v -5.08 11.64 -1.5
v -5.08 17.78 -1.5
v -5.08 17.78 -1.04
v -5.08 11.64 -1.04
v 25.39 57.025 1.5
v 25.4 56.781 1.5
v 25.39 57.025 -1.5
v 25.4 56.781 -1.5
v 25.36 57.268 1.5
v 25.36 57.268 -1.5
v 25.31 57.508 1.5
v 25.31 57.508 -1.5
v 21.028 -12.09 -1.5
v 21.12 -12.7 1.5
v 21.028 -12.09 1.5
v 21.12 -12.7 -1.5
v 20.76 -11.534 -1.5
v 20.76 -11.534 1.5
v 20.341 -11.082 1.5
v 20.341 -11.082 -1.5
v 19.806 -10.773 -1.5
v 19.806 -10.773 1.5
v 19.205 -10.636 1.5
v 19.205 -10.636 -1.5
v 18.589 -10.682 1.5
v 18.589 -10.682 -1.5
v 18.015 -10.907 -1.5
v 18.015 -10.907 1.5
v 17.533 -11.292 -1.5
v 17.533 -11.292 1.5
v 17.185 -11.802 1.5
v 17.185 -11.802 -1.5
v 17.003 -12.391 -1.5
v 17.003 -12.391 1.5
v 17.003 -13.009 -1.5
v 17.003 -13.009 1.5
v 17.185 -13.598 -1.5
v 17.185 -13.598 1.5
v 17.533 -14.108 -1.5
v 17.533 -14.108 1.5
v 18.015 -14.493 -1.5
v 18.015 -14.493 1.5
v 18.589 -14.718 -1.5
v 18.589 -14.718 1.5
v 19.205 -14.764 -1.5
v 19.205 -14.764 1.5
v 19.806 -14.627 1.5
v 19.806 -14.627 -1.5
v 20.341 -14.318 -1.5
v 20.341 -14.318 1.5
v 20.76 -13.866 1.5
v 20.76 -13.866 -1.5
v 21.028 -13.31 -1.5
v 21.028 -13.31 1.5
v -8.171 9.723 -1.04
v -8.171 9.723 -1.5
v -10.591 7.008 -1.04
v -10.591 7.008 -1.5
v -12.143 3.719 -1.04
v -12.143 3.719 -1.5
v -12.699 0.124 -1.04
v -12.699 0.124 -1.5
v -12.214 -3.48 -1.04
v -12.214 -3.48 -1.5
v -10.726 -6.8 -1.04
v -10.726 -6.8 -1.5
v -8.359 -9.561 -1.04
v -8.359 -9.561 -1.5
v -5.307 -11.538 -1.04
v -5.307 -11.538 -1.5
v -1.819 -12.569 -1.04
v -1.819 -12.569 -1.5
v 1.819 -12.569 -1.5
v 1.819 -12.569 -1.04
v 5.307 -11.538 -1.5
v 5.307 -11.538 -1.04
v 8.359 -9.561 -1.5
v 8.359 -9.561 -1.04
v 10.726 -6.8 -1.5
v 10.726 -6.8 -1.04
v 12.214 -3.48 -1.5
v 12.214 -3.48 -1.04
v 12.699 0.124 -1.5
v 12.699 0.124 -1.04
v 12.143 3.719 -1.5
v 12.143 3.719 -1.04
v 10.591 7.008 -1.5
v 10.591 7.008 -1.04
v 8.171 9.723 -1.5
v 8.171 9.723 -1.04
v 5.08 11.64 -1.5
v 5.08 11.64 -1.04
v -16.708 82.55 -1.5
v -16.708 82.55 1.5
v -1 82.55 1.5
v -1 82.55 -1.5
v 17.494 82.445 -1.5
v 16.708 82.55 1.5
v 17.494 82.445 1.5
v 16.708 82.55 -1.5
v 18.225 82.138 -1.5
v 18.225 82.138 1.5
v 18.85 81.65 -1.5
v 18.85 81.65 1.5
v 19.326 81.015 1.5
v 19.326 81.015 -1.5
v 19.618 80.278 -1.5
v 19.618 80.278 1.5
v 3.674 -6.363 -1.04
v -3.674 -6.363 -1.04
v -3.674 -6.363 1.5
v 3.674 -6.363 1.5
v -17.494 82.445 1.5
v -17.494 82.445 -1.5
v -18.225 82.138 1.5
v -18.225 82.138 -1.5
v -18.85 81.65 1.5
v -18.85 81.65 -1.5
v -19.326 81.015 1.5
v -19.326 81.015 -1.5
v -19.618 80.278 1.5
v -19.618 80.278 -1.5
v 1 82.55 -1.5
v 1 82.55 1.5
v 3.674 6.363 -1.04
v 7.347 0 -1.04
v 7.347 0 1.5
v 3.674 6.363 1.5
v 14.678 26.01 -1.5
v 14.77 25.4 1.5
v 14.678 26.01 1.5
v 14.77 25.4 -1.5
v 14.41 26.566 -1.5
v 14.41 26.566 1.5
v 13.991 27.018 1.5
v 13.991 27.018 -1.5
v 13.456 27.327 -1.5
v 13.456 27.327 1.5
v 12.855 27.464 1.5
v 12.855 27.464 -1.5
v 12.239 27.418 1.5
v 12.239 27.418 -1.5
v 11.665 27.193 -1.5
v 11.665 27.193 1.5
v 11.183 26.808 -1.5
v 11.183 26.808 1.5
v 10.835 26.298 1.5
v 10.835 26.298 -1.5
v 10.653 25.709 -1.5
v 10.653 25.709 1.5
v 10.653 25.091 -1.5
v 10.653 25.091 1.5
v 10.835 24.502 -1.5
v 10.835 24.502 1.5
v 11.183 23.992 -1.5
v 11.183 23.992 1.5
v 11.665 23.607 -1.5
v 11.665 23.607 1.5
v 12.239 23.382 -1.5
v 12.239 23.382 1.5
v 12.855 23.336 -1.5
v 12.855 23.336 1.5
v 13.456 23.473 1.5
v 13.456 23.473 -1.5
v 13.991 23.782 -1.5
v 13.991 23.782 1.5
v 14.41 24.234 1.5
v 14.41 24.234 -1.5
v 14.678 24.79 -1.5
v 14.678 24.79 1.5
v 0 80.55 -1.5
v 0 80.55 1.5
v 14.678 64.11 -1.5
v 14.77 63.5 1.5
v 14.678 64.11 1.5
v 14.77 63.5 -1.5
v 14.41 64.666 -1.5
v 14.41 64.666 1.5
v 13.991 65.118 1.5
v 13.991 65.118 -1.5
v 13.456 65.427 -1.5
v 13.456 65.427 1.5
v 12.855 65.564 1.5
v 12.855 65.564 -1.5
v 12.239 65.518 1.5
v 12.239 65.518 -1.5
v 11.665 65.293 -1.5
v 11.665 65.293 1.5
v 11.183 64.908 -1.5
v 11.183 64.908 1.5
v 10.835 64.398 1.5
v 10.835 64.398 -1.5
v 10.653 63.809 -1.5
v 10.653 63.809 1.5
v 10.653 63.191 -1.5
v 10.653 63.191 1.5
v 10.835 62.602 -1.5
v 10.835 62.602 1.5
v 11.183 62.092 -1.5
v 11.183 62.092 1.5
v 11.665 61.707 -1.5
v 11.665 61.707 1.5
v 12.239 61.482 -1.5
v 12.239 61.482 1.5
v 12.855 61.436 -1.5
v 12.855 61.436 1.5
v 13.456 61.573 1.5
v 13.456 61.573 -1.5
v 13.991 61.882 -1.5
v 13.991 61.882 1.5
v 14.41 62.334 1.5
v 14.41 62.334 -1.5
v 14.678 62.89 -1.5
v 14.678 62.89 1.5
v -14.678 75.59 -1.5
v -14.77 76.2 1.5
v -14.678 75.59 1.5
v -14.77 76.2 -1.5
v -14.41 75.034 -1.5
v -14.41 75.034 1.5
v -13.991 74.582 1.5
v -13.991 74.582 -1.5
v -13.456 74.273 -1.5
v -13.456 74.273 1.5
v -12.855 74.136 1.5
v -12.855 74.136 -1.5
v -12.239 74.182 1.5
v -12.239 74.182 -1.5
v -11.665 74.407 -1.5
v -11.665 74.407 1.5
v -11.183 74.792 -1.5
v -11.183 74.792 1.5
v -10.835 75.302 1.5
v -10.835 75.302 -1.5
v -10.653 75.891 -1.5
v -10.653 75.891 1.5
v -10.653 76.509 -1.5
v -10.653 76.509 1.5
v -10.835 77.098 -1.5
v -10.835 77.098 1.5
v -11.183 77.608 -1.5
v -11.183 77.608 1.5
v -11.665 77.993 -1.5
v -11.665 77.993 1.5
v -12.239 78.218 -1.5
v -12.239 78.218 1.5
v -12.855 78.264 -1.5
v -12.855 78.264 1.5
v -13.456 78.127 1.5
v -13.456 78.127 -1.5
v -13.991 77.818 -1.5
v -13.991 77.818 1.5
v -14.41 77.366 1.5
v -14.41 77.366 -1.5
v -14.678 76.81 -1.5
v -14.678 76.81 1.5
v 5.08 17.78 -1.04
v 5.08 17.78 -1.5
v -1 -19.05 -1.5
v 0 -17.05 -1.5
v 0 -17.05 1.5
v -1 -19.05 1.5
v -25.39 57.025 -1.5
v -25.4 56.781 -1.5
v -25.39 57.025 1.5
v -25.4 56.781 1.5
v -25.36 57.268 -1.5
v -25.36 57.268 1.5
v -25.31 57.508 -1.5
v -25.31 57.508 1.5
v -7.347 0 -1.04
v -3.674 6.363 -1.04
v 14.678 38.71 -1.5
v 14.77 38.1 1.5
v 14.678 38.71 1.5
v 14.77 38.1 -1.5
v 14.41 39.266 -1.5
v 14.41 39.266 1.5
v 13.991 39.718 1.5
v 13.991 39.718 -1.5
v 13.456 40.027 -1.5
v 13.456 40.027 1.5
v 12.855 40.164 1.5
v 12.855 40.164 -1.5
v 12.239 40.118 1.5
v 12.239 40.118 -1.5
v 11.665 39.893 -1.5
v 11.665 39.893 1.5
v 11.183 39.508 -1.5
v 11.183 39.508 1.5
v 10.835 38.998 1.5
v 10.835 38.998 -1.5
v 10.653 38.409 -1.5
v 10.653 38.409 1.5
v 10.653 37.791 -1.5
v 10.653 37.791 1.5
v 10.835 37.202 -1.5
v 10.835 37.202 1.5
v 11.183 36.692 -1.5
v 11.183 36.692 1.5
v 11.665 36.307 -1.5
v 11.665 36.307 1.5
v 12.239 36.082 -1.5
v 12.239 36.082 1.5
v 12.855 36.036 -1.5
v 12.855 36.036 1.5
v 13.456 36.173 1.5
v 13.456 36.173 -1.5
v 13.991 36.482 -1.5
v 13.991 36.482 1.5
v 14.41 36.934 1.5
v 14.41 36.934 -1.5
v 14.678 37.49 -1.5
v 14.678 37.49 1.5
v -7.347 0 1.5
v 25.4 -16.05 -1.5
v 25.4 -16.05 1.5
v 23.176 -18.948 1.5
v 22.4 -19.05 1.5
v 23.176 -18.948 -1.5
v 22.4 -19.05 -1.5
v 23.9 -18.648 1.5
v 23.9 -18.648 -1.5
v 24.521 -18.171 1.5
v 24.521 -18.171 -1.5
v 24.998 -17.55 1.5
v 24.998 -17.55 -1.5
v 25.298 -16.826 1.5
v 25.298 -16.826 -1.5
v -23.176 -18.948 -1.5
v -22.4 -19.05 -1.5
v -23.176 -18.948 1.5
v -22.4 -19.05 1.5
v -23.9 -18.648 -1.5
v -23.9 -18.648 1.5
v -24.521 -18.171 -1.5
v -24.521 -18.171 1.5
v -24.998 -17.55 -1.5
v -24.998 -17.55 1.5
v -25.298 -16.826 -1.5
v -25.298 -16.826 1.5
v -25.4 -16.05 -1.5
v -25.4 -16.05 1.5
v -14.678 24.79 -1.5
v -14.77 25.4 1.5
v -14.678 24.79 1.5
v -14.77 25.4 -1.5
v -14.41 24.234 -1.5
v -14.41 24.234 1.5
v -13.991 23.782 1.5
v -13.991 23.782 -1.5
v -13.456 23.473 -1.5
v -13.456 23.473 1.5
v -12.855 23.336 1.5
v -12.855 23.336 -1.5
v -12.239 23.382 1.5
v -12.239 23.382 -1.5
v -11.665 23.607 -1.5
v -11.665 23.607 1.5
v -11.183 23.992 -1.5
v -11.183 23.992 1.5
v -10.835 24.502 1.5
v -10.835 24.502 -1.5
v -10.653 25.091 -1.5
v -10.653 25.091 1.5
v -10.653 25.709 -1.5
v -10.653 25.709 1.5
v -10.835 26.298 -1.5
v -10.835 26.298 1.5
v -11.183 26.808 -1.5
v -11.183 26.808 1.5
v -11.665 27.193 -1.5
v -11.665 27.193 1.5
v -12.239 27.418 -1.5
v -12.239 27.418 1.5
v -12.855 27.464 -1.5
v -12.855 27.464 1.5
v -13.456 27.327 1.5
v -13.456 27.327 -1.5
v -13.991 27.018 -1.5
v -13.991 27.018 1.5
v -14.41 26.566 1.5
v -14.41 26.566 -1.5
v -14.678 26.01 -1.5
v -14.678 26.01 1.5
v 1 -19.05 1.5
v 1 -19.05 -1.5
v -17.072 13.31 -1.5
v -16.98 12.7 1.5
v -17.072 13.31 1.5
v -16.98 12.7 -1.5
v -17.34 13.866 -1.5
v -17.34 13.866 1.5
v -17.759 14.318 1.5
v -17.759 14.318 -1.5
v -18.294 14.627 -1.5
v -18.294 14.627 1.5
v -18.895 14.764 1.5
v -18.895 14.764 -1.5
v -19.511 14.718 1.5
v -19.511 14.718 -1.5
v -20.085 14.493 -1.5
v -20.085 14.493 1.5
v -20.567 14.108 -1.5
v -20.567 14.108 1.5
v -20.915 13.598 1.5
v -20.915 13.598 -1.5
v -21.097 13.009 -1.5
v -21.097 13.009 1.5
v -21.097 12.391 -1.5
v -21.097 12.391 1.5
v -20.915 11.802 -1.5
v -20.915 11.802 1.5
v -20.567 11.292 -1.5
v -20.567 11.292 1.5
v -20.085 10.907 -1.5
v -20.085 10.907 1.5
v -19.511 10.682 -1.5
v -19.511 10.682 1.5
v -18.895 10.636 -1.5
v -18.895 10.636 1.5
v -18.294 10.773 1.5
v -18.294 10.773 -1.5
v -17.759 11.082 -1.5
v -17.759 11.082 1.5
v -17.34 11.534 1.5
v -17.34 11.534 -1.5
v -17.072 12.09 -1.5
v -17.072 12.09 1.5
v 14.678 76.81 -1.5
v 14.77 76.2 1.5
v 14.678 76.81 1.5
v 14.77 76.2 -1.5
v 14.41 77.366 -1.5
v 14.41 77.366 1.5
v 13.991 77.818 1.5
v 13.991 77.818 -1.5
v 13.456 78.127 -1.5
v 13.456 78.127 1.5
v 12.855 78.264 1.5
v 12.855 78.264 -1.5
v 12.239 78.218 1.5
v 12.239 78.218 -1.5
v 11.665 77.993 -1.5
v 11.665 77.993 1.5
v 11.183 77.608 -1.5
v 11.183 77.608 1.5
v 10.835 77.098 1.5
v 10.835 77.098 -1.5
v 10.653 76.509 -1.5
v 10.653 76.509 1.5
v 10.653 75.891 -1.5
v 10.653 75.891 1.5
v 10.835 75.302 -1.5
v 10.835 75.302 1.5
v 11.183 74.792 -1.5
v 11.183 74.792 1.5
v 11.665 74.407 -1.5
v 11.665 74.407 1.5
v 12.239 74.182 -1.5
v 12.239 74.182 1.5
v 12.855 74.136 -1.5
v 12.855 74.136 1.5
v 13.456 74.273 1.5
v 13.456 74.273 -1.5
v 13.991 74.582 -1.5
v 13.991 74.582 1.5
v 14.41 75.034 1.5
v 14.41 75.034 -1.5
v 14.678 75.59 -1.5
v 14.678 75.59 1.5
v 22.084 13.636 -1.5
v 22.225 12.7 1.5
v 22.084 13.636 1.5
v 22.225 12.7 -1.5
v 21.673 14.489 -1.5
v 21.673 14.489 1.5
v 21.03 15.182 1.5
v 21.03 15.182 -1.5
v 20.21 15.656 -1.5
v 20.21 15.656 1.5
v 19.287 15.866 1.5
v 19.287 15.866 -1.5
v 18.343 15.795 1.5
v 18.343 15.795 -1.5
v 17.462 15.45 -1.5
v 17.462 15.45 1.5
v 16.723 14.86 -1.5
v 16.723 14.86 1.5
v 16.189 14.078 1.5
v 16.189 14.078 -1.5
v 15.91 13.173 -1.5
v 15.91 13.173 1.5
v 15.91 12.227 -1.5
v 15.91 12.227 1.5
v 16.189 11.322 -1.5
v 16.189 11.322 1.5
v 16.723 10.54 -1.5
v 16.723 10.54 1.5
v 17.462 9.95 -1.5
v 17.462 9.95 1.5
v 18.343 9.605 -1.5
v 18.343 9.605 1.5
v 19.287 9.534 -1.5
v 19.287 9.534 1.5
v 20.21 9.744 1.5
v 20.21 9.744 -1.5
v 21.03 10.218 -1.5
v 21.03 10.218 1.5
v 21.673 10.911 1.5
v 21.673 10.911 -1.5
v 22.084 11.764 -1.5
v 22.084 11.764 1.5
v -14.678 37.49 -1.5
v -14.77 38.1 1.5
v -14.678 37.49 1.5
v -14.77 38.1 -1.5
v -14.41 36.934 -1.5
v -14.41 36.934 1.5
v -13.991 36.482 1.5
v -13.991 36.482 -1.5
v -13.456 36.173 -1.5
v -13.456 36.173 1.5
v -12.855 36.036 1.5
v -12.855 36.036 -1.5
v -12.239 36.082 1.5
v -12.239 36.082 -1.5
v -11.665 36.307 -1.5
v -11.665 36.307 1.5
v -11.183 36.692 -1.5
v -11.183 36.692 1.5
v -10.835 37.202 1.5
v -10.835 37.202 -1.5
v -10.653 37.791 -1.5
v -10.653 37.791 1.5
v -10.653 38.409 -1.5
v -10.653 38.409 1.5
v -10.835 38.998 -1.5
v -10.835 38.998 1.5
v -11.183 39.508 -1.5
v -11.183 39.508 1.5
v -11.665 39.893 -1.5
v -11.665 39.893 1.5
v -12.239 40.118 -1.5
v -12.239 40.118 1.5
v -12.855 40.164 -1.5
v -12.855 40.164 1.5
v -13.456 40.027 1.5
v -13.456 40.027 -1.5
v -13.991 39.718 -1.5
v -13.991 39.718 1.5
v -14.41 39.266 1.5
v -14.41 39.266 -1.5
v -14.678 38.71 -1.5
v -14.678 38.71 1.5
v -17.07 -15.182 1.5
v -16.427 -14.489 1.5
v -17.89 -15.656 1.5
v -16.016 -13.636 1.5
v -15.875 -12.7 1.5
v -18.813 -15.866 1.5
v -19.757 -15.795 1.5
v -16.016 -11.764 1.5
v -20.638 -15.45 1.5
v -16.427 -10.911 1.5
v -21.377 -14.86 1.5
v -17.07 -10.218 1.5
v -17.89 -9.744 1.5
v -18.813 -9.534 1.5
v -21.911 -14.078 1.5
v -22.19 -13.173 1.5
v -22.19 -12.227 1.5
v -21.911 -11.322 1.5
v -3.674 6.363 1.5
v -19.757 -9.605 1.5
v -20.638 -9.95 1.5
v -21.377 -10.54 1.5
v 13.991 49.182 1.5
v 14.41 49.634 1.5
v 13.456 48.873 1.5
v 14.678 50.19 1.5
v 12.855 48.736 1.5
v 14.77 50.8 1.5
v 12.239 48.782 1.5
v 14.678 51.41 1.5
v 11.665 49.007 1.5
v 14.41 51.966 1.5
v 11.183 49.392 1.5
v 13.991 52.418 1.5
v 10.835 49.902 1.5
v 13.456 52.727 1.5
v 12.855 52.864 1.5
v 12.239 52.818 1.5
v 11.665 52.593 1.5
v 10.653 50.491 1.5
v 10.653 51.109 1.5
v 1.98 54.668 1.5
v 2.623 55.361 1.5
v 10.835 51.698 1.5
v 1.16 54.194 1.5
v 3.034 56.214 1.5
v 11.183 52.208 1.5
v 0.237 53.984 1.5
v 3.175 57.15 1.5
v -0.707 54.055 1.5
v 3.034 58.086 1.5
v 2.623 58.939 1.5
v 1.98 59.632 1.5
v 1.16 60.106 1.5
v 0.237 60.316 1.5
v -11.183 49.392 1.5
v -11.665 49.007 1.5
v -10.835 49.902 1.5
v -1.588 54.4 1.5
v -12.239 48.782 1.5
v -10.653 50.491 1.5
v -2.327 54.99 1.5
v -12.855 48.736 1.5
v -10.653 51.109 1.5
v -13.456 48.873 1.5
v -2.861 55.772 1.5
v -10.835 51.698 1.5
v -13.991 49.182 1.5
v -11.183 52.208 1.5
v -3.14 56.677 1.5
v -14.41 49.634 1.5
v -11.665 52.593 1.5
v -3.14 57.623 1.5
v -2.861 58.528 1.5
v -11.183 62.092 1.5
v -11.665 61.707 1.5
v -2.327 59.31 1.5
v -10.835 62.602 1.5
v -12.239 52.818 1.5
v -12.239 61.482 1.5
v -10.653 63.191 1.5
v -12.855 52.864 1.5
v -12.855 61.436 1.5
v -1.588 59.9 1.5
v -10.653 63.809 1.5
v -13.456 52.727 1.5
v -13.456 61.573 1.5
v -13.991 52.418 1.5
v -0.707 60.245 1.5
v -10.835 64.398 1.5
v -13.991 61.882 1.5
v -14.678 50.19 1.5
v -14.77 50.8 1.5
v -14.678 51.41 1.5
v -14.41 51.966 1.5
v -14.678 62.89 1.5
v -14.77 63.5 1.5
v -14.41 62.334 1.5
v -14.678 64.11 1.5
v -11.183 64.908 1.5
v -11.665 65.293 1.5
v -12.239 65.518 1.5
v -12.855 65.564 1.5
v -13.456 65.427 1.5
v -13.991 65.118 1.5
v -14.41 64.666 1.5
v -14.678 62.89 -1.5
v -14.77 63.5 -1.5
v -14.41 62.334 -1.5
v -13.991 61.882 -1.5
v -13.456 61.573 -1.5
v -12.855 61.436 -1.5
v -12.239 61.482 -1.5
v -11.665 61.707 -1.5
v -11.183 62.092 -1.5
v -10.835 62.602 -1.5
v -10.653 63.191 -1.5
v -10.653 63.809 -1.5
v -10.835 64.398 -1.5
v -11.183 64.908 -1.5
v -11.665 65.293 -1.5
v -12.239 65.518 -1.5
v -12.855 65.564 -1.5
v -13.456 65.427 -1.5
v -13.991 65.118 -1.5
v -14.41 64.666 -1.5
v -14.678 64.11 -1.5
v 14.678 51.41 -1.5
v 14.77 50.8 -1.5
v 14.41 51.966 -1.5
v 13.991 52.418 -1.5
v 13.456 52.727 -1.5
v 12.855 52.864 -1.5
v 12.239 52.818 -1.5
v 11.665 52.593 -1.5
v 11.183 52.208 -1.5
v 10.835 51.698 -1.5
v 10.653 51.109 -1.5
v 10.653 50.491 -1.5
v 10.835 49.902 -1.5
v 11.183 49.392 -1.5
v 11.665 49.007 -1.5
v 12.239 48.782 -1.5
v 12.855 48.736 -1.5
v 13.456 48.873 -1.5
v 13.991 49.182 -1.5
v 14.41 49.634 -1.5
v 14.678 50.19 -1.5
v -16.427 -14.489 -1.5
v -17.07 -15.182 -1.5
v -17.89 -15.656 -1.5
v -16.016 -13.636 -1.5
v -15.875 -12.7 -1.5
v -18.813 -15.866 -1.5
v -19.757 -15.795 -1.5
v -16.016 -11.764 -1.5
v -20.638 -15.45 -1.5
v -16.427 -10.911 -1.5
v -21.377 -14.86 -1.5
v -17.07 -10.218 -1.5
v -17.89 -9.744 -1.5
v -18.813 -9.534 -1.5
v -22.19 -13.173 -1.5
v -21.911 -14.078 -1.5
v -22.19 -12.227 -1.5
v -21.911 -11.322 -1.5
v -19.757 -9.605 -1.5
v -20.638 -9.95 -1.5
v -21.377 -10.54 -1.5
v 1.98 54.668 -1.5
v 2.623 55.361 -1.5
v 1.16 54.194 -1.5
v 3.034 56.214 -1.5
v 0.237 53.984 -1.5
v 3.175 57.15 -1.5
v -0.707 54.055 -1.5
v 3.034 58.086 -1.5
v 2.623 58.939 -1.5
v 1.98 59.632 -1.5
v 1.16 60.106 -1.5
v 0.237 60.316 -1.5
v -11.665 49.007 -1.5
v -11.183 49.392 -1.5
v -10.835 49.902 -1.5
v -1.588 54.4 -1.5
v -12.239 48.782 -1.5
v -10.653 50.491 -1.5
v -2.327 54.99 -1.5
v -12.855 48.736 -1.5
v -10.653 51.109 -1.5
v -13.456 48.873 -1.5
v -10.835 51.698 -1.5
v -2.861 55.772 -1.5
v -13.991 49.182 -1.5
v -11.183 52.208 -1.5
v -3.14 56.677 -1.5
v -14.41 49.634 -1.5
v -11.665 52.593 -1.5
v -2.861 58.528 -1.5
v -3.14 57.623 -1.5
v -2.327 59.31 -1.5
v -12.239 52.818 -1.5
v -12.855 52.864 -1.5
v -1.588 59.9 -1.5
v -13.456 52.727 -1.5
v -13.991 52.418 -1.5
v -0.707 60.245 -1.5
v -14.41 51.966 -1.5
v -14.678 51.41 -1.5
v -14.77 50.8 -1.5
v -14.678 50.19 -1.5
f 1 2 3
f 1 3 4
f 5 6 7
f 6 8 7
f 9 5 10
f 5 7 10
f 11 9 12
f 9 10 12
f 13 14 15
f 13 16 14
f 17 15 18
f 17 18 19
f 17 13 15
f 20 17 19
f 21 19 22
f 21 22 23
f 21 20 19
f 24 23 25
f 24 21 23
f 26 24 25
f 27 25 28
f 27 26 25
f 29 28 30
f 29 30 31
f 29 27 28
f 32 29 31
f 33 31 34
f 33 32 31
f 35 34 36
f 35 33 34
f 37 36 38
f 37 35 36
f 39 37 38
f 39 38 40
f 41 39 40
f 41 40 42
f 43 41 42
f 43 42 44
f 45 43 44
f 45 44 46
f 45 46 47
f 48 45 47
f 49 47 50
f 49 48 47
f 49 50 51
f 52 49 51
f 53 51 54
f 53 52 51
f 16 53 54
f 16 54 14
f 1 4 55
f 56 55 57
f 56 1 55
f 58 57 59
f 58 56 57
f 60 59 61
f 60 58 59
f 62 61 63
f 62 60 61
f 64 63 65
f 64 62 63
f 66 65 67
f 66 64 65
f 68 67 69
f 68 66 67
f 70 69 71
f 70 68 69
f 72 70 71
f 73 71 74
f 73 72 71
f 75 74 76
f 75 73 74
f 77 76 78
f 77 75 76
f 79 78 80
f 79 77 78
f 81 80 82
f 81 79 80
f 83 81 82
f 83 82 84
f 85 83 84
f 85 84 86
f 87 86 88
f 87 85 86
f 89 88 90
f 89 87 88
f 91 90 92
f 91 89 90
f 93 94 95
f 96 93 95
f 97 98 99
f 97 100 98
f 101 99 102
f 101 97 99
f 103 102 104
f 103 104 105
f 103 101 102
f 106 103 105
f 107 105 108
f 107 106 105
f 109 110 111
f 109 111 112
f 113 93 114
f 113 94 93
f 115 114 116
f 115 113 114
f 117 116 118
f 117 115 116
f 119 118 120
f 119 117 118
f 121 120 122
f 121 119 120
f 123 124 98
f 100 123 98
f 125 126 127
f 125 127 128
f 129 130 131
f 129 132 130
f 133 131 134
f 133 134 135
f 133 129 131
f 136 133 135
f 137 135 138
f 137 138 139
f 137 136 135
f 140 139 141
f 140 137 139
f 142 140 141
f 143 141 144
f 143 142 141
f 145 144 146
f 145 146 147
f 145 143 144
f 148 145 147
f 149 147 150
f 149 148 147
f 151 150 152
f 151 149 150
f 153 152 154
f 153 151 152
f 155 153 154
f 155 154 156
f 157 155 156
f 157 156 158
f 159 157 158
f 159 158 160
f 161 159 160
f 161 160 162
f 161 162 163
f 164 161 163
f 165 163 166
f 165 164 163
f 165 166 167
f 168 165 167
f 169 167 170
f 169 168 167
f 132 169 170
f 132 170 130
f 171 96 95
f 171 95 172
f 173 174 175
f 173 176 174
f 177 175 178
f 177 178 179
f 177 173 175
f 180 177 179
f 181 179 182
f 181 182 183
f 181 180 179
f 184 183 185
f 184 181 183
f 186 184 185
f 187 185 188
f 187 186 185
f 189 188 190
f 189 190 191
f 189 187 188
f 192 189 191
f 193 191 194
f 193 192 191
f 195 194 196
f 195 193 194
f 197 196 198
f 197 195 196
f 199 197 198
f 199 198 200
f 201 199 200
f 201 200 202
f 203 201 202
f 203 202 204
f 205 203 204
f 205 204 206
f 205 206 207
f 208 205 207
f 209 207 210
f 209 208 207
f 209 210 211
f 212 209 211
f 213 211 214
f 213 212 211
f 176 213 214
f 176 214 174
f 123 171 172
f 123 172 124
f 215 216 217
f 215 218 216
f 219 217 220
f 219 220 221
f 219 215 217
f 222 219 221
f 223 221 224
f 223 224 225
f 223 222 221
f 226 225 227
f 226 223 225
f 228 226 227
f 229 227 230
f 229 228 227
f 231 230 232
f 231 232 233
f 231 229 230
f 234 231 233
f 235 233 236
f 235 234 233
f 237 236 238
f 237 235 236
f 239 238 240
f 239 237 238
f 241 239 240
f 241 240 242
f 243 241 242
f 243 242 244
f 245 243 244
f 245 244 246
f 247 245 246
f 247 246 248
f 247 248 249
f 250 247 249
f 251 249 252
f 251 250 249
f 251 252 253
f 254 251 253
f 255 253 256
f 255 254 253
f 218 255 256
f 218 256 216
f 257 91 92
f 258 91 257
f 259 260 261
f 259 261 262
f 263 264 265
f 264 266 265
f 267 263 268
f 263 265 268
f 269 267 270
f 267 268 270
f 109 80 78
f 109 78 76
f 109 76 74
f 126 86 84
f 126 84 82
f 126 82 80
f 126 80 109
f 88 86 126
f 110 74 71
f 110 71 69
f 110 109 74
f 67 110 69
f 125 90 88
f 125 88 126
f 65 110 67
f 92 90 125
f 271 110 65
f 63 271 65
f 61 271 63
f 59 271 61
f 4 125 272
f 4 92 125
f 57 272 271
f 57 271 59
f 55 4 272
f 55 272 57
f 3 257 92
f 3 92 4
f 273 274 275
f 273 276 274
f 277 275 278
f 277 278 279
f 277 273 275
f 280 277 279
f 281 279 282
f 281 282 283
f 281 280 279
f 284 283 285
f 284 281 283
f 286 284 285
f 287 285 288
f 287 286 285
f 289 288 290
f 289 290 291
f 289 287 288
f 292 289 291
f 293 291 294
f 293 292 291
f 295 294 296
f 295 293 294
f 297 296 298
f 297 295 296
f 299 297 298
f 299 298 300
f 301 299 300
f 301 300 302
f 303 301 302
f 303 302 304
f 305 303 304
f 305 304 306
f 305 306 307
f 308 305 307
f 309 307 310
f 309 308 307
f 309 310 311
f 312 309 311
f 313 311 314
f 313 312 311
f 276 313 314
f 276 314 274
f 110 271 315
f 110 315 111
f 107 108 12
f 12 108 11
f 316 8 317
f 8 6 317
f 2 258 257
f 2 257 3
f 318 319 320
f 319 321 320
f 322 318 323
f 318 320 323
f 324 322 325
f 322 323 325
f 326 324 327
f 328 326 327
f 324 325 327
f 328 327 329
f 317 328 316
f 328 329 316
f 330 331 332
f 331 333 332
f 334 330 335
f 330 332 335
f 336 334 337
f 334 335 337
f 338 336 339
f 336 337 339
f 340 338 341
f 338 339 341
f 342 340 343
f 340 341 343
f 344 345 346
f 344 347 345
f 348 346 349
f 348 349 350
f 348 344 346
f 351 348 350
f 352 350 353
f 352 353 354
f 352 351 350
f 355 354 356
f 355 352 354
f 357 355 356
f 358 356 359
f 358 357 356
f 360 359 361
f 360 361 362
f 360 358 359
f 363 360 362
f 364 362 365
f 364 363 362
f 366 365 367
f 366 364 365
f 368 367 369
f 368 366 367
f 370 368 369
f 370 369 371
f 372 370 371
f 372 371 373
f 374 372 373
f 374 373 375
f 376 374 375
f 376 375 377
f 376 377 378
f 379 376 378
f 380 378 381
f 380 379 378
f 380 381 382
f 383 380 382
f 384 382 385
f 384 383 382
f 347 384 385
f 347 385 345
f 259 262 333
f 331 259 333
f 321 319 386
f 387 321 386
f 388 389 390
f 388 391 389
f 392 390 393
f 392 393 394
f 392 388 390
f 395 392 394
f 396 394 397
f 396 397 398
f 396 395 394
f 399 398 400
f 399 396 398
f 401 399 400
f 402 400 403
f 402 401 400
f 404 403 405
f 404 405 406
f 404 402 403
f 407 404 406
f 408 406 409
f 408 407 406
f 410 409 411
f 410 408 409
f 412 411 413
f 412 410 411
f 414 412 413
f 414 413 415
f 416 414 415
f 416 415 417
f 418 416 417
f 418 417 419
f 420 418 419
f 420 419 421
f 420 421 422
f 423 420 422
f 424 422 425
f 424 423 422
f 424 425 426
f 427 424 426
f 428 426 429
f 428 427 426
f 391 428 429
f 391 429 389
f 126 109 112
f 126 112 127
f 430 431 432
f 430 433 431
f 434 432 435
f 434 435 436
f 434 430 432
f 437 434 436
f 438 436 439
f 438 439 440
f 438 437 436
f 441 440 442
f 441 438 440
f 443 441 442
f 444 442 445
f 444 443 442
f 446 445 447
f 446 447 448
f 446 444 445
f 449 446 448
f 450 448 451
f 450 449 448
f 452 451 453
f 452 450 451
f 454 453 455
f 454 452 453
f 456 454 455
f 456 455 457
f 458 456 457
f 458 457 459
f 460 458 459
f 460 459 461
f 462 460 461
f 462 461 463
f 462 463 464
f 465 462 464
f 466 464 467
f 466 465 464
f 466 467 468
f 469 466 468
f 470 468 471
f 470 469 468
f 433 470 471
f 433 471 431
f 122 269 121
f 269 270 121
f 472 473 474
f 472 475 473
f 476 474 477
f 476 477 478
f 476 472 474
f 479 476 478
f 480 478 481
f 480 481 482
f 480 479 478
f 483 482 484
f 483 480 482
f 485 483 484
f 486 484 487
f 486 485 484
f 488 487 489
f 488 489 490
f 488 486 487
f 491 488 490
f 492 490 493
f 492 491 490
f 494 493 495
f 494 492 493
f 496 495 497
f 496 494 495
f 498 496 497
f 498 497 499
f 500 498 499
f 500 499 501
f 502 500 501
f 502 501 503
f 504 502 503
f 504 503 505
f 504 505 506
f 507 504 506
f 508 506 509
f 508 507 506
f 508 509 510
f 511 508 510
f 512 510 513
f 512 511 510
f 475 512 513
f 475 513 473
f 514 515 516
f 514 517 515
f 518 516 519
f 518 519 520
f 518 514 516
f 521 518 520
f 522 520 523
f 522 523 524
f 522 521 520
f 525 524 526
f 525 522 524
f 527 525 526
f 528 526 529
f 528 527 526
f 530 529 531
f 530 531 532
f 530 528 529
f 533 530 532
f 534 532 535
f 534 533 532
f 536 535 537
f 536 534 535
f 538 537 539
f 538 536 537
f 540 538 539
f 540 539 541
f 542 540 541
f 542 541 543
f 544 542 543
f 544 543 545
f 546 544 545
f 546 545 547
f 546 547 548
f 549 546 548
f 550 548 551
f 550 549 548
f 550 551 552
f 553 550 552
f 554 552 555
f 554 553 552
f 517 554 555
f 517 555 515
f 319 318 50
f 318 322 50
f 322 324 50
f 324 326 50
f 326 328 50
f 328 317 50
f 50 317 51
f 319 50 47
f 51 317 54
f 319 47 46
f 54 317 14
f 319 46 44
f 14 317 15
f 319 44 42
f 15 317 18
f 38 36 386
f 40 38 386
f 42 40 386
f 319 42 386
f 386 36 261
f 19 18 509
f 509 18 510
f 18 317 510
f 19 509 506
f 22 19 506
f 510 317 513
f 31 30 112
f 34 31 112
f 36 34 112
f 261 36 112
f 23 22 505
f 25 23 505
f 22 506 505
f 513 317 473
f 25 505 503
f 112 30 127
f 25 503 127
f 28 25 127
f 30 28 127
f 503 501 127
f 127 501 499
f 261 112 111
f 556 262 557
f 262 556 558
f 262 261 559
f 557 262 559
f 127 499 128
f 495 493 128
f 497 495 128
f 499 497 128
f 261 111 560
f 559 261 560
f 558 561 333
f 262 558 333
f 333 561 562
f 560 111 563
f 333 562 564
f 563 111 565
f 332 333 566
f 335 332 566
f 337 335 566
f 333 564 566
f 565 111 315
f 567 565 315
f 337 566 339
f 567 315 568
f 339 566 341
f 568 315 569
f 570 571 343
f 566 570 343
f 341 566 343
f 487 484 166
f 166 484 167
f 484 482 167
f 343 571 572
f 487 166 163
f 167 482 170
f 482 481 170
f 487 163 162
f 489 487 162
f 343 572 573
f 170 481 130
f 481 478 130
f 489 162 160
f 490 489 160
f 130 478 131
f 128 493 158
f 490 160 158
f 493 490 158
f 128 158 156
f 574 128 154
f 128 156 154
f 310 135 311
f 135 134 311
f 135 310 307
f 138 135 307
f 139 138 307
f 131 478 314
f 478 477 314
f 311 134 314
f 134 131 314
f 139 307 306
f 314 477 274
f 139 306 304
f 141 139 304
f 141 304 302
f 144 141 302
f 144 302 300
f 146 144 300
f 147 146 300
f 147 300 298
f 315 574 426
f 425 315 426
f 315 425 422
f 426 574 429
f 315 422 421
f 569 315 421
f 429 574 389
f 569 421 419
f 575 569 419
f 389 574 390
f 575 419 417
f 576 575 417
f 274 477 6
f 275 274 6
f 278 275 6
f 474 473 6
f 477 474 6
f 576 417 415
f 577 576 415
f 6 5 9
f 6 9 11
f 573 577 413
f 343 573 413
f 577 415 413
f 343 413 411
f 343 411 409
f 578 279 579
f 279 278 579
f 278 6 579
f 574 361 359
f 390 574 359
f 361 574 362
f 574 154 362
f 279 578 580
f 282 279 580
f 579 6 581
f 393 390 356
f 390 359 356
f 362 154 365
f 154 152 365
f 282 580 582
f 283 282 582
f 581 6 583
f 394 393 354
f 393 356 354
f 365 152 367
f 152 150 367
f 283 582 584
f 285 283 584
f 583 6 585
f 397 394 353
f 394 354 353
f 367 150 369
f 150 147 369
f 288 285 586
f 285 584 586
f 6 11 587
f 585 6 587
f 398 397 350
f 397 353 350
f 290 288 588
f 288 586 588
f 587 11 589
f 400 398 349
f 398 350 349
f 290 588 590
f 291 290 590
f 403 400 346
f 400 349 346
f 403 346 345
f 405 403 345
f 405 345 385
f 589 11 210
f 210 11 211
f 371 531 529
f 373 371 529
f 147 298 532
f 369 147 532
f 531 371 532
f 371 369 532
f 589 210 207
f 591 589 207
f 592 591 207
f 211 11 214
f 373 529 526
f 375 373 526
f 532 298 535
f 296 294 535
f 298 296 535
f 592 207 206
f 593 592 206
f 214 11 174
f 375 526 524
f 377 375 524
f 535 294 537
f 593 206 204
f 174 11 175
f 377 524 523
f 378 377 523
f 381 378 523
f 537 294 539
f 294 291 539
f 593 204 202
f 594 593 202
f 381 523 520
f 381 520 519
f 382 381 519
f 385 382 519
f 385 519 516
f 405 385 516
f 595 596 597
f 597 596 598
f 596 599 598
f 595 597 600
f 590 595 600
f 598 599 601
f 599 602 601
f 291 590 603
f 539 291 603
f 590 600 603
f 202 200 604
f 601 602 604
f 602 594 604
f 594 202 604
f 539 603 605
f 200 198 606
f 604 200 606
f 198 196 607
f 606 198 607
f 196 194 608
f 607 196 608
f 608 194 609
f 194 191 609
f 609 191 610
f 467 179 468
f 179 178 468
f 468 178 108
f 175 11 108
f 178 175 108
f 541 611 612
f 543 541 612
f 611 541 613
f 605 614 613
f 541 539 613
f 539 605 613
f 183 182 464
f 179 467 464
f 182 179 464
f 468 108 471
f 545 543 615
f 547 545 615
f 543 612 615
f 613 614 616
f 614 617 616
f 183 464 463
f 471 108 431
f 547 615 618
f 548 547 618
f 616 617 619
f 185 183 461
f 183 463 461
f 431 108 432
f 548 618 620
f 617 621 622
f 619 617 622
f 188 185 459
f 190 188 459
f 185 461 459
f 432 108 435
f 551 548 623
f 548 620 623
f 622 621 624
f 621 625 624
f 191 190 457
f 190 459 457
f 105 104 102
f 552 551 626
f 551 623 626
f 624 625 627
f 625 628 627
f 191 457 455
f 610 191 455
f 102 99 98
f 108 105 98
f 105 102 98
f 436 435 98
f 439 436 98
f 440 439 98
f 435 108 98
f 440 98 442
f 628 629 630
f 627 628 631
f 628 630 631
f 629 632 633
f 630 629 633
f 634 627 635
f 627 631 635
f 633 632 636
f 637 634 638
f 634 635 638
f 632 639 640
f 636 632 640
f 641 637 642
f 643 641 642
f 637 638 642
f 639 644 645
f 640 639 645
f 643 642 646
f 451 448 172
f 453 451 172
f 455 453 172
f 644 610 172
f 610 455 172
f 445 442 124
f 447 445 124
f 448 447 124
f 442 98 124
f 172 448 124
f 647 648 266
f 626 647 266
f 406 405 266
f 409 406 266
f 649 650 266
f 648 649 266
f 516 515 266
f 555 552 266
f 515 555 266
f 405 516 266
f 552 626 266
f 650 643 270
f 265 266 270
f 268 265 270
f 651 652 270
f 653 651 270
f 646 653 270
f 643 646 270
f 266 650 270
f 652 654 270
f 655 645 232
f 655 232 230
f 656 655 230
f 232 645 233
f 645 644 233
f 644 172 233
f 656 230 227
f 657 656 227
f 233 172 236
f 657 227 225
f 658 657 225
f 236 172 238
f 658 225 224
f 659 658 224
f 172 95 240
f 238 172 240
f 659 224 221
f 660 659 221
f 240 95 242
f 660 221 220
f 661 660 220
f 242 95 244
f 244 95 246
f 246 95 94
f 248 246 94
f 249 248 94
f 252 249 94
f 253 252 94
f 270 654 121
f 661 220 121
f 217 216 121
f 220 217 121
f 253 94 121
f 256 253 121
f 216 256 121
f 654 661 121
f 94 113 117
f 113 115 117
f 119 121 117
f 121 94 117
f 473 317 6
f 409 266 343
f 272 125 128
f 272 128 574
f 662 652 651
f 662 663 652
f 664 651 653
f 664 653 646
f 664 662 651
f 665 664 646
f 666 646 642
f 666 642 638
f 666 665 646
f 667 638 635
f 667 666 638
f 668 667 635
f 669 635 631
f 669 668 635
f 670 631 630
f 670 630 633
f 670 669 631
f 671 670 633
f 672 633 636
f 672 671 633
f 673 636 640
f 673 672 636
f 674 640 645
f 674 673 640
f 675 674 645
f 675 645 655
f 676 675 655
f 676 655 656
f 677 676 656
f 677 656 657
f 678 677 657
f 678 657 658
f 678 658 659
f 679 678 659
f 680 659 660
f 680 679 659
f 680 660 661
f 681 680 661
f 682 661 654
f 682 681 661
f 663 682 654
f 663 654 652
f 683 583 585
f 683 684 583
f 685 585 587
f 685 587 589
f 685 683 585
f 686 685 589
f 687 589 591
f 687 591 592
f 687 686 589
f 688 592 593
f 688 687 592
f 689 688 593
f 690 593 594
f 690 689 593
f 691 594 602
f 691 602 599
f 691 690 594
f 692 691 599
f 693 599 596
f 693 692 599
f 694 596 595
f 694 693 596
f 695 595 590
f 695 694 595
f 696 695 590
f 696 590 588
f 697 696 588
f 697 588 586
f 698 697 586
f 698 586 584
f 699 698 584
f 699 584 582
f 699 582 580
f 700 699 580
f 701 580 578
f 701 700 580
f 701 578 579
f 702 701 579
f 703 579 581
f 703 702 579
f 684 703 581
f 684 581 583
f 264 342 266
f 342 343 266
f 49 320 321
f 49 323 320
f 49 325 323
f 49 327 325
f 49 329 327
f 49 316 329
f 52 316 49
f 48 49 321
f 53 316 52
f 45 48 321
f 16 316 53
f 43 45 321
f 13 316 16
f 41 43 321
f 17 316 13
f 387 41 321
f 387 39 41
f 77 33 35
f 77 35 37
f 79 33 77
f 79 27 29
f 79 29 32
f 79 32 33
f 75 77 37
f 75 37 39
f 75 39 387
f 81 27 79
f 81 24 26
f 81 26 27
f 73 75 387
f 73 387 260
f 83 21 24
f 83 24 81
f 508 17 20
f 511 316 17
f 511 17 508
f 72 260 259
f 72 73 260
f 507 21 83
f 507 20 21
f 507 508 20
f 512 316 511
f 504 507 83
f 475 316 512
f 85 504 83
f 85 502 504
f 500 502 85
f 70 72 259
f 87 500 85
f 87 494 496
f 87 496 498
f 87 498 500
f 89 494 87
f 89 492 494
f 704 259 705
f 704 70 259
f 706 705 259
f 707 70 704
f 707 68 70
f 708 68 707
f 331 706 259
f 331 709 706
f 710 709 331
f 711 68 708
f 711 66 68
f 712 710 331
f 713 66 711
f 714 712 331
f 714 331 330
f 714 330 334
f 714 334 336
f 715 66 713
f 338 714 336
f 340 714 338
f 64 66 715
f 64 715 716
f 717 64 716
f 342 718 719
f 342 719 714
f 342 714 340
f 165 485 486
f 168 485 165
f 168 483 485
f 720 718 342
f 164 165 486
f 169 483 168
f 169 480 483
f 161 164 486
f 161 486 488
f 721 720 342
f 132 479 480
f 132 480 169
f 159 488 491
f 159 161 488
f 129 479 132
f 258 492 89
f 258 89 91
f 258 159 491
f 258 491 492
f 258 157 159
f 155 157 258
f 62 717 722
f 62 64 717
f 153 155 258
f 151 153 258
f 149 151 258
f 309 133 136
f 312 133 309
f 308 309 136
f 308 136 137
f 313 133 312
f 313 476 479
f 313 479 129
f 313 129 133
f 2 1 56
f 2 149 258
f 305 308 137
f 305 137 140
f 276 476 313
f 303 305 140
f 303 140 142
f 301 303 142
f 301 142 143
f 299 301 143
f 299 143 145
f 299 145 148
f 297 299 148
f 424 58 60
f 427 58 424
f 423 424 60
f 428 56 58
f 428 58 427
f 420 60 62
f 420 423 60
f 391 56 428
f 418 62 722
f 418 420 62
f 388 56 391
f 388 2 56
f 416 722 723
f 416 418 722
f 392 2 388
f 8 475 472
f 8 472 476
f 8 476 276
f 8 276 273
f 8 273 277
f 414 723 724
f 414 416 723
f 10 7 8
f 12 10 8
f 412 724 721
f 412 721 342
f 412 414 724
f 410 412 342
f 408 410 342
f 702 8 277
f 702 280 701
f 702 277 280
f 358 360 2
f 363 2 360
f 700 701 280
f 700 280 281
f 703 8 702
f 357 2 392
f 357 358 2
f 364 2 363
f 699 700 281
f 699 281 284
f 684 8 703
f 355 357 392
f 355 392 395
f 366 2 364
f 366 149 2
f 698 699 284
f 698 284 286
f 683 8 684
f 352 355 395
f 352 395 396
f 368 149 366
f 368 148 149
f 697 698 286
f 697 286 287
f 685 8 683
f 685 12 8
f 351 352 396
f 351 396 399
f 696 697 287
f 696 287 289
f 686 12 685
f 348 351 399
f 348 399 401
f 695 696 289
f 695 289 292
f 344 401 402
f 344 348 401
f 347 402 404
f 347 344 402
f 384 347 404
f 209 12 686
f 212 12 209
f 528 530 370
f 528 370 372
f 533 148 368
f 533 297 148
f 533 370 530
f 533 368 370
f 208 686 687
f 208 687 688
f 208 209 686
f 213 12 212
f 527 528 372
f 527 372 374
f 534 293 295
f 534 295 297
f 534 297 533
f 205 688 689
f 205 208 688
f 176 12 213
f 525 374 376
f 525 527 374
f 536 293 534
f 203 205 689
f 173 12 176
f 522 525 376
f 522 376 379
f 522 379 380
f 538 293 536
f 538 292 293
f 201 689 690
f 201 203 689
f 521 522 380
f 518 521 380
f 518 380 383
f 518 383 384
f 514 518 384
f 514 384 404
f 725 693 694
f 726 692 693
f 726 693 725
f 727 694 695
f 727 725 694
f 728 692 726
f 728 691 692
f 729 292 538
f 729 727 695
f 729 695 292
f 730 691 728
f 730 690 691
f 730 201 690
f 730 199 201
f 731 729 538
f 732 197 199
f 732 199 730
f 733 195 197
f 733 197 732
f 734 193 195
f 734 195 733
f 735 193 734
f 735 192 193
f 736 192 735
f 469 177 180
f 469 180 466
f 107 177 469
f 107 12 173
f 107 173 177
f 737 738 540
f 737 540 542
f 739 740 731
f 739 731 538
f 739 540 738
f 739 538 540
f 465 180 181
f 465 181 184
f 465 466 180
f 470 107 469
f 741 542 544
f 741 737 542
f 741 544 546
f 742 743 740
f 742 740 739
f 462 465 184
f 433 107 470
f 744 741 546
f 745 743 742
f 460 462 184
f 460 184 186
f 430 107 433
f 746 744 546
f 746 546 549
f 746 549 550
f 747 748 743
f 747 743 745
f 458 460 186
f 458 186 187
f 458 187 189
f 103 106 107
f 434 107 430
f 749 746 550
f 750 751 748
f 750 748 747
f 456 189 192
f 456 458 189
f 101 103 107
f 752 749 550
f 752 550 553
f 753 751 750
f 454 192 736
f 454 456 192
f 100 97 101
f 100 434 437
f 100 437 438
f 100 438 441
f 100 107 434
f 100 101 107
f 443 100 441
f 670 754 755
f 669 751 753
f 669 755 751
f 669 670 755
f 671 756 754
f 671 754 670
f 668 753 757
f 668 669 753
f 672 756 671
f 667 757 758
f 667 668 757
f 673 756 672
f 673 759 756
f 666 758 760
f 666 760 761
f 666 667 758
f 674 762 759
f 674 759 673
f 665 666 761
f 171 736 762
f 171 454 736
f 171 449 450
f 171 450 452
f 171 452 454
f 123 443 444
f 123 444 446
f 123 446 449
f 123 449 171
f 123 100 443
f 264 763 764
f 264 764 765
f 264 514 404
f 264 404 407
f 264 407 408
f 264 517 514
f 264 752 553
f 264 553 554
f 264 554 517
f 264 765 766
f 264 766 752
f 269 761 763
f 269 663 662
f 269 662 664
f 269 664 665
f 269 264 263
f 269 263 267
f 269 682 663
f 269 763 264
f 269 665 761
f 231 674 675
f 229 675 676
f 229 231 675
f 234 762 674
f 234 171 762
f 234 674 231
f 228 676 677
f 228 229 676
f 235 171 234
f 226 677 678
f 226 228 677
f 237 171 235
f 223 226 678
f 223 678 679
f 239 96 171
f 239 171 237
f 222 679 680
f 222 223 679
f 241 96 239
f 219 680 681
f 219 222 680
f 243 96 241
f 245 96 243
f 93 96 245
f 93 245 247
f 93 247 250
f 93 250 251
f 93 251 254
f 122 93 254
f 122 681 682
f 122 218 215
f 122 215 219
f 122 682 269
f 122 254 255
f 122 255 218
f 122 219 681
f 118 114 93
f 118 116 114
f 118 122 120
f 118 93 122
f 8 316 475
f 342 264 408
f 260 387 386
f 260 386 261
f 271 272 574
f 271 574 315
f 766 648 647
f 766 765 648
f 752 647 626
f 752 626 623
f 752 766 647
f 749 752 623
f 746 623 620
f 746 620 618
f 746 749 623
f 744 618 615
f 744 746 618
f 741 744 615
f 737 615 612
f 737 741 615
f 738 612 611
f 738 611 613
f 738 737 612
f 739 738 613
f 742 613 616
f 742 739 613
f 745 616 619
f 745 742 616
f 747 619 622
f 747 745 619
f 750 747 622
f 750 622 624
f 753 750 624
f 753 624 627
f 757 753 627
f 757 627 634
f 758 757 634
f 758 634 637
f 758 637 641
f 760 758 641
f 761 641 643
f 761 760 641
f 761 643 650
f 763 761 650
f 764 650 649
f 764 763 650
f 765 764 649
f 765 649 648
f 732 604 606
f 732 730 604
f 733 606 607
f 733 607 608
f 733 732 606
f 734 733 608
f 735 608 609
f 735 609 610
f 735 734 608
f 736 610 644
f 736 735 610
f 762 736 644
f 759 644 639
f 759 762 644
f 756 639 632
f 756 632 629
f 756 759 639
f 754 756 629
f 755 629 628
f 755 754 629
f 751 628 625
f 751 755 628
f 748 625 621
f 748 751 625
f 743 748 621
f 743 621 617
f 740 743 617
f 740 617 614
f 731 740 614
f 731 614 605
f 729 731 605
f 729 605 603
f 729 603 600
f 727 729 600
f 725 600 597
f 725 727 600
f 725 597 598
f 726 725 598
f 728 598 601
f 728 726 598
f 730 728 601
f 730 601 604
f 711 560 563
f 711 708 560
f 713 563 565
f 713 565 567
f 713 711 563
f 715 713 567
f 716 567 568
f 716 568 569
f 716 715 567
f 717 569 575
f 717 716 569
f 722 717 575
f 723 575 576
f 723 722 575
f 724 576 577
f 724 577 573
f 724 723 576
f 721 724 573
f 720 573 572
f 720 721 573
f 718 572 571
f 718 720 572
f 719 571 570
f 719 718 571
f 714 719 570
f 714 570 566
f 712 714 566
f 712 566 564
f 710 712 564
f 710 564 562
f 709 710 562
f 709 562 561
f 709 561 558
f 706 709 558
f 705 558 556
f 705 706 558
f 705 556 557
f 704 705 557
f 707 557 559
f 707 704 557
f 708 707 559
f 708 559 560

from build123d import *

# Parameters (mm, degrees)
SKETCH1_R           = 12.7
SKETCH1_R_2         = 3.175
SKETCH1_R_3         = 2.07
BOSS_EXTRUDE1_DEPTH = 1.5
FILLET1_R           = 3.000000096
CUT_EXTRUDE1_START  = -3
CUT_EXTRUDE1_DEPTH  = 3
BOSS_EXTRUDE3_START = -2.54
BOSS_EXTRUDE3_DEPTH = 2.54


with BuildPart() as part:
    # Sketch1 → Boss-Extrude1 (new, symmetric)
    with BuildSketch(Plane.XY):
        Polygon((-19.05, 82.55), (19.05, 82.55), (25.4, 57.15), (25.4, -19.05), (-25.4, -19.05), (-25.4, 57.15), align=None)
        Circle(SKETCH1_R, mode=Mode.SUBTRACT)
        with Locations((-19.05, -12.7)):
            Circle(SKETCH1_R_2, mode=Mode.SUBTRACT)
        with Locations((19.05, 12.7)):
            Circle(SKETCH1_R_2, mode=Mode.SUBTRACT)
        with Locations((-19.05, 12.7)):
            Circle(SKETCH1_R_3, mode=Mode.SUBTRACT)
        with Locations((19.05, -12.7)):
            Circle(SKETCH1_R_3, mode=Mode.SUBTRACT)
        with Locations((0, 57.15)):
            Circle(SKETCH1_R_2, mode=Mode.SUBTRACT)
        with Locations((12.7, 25.4)):
            Circle(SKETCH1_R_3, mode=Mode.SUBTRACT)
        with Locations((12.7, 38.1)):
            Circle(SKETCH1_R_3, mode=Mode.SUBTRACT)
        with Locations((12.7, 50.8)):
            Circle(SKETCH1_R_3, mode=Mode.SUBTRACT)
        with Locations((12.7, 63.5)):
            Circle(SKETCH1_R_3, mode=Mode.SUBTRACT)
        with Locations((12.7, 76.2)):
            Circle(SKETCH1_R_3, mode=Mode.SUBTRACT)
        with Locations(Location((-12.7, 25.4, 0), (0, 0, 180))):
            Circle(SKETCH1_R_3, mode=Mode.SUBTRACT)
        with Locations(Location((-12.7, 38.1, 0), (0, 0, 180))):
            Circle(SKETCH1_R_3, mode=Mode.SUBTRACT)
        with Locations(Location((-12.7, 50.8, 0), (0, 0, 180))):
            Circle(SKETCH1_R_3, mode=Mode.SUBTRACT)
        with Locations(Location((-12.7, 63.5, 0), (0, 0, 180))):
            Circle(SKETCH1_R_3, mode=Mode.SUBTRACT)
        with Locations(Location((-12.7, 76.2, 0), (0, 0, 180))):
            Circle(SKETCH1_R_3, mode=Mode.SUBTRACT)
    extrude(amount=BOSS_EXTRUDE1_DEPTH, both=True)

    # Fillet1
    fillet1_edges = [part.edges().sort_by_distance(p)[0] for p in [
        (-19.05, 82.55, 0),
        (19.05, 82.55, 0),
        (25.4, 57.15, 0),
        (25.4, -19.05, 0),
        (-25.4, -19.05, 0),
        (-25.4, 57.15, 0),
    ]]
    fillet(fillet1_edges, radius=FILLET1_R)

    # Sketch2 → Cut-Extrude1 (cut)
    with BuildSketch(Plane.XY.offset(1.5).offset(CUT_EXTRUDE1_START)):
        with BuildLine():
            Line((5.08, 17.78), (-5.08, 17.78))
            Line((-5.08, 17.78), (-5.08, 11.639742265))
            ThreePointArc((-5.08, 11.639742265), (0, 12.7), (5.08, 11.639742265))
            Line((5.08, 11.639742265), (5.08, 17.78))
        make_face()
        Polygon((0, -17.05), (-1, -19.05), (1, -19.05), align=None)
        Polygon((1, 82.55), (-1, 82.55), (0, 80.55), align=None)
    extrude(amount=CUT_EXTRUDE1_DEPTH, mode=Mode.SUBTRACT)

    # Sketch3 → Boss-Extrude3 (add)
    with BuildSketch(Plane.XY.offset(1.5).offset(BOSS_EXTRUDE3_START)):
        with BuildLine():
            Line((5.08, 17.78), (5.08, 11.639742265))
            ThreePointArc((5.08, 11.639742265), (0, -12.7), (-5.08, 11.639742265))
            Line((-5.08, 11.639742265), (-5.08, 17.78))
            Line((-5.08, 17.78), (5.08, 17.78))
        make_face()
        Polygon((7.347013116, 0), (3.673506558, 6.3627), (-3.673506558, 6.3627), (-7.347013116, 0), (-3.673506558, -6.3627), (3.673506558, -6.3627), align=None, mode=Mode.SUBTRACT)
    extrude(amount=BOSS_EXTRUDE3_DEPTH)


solid = part.part
